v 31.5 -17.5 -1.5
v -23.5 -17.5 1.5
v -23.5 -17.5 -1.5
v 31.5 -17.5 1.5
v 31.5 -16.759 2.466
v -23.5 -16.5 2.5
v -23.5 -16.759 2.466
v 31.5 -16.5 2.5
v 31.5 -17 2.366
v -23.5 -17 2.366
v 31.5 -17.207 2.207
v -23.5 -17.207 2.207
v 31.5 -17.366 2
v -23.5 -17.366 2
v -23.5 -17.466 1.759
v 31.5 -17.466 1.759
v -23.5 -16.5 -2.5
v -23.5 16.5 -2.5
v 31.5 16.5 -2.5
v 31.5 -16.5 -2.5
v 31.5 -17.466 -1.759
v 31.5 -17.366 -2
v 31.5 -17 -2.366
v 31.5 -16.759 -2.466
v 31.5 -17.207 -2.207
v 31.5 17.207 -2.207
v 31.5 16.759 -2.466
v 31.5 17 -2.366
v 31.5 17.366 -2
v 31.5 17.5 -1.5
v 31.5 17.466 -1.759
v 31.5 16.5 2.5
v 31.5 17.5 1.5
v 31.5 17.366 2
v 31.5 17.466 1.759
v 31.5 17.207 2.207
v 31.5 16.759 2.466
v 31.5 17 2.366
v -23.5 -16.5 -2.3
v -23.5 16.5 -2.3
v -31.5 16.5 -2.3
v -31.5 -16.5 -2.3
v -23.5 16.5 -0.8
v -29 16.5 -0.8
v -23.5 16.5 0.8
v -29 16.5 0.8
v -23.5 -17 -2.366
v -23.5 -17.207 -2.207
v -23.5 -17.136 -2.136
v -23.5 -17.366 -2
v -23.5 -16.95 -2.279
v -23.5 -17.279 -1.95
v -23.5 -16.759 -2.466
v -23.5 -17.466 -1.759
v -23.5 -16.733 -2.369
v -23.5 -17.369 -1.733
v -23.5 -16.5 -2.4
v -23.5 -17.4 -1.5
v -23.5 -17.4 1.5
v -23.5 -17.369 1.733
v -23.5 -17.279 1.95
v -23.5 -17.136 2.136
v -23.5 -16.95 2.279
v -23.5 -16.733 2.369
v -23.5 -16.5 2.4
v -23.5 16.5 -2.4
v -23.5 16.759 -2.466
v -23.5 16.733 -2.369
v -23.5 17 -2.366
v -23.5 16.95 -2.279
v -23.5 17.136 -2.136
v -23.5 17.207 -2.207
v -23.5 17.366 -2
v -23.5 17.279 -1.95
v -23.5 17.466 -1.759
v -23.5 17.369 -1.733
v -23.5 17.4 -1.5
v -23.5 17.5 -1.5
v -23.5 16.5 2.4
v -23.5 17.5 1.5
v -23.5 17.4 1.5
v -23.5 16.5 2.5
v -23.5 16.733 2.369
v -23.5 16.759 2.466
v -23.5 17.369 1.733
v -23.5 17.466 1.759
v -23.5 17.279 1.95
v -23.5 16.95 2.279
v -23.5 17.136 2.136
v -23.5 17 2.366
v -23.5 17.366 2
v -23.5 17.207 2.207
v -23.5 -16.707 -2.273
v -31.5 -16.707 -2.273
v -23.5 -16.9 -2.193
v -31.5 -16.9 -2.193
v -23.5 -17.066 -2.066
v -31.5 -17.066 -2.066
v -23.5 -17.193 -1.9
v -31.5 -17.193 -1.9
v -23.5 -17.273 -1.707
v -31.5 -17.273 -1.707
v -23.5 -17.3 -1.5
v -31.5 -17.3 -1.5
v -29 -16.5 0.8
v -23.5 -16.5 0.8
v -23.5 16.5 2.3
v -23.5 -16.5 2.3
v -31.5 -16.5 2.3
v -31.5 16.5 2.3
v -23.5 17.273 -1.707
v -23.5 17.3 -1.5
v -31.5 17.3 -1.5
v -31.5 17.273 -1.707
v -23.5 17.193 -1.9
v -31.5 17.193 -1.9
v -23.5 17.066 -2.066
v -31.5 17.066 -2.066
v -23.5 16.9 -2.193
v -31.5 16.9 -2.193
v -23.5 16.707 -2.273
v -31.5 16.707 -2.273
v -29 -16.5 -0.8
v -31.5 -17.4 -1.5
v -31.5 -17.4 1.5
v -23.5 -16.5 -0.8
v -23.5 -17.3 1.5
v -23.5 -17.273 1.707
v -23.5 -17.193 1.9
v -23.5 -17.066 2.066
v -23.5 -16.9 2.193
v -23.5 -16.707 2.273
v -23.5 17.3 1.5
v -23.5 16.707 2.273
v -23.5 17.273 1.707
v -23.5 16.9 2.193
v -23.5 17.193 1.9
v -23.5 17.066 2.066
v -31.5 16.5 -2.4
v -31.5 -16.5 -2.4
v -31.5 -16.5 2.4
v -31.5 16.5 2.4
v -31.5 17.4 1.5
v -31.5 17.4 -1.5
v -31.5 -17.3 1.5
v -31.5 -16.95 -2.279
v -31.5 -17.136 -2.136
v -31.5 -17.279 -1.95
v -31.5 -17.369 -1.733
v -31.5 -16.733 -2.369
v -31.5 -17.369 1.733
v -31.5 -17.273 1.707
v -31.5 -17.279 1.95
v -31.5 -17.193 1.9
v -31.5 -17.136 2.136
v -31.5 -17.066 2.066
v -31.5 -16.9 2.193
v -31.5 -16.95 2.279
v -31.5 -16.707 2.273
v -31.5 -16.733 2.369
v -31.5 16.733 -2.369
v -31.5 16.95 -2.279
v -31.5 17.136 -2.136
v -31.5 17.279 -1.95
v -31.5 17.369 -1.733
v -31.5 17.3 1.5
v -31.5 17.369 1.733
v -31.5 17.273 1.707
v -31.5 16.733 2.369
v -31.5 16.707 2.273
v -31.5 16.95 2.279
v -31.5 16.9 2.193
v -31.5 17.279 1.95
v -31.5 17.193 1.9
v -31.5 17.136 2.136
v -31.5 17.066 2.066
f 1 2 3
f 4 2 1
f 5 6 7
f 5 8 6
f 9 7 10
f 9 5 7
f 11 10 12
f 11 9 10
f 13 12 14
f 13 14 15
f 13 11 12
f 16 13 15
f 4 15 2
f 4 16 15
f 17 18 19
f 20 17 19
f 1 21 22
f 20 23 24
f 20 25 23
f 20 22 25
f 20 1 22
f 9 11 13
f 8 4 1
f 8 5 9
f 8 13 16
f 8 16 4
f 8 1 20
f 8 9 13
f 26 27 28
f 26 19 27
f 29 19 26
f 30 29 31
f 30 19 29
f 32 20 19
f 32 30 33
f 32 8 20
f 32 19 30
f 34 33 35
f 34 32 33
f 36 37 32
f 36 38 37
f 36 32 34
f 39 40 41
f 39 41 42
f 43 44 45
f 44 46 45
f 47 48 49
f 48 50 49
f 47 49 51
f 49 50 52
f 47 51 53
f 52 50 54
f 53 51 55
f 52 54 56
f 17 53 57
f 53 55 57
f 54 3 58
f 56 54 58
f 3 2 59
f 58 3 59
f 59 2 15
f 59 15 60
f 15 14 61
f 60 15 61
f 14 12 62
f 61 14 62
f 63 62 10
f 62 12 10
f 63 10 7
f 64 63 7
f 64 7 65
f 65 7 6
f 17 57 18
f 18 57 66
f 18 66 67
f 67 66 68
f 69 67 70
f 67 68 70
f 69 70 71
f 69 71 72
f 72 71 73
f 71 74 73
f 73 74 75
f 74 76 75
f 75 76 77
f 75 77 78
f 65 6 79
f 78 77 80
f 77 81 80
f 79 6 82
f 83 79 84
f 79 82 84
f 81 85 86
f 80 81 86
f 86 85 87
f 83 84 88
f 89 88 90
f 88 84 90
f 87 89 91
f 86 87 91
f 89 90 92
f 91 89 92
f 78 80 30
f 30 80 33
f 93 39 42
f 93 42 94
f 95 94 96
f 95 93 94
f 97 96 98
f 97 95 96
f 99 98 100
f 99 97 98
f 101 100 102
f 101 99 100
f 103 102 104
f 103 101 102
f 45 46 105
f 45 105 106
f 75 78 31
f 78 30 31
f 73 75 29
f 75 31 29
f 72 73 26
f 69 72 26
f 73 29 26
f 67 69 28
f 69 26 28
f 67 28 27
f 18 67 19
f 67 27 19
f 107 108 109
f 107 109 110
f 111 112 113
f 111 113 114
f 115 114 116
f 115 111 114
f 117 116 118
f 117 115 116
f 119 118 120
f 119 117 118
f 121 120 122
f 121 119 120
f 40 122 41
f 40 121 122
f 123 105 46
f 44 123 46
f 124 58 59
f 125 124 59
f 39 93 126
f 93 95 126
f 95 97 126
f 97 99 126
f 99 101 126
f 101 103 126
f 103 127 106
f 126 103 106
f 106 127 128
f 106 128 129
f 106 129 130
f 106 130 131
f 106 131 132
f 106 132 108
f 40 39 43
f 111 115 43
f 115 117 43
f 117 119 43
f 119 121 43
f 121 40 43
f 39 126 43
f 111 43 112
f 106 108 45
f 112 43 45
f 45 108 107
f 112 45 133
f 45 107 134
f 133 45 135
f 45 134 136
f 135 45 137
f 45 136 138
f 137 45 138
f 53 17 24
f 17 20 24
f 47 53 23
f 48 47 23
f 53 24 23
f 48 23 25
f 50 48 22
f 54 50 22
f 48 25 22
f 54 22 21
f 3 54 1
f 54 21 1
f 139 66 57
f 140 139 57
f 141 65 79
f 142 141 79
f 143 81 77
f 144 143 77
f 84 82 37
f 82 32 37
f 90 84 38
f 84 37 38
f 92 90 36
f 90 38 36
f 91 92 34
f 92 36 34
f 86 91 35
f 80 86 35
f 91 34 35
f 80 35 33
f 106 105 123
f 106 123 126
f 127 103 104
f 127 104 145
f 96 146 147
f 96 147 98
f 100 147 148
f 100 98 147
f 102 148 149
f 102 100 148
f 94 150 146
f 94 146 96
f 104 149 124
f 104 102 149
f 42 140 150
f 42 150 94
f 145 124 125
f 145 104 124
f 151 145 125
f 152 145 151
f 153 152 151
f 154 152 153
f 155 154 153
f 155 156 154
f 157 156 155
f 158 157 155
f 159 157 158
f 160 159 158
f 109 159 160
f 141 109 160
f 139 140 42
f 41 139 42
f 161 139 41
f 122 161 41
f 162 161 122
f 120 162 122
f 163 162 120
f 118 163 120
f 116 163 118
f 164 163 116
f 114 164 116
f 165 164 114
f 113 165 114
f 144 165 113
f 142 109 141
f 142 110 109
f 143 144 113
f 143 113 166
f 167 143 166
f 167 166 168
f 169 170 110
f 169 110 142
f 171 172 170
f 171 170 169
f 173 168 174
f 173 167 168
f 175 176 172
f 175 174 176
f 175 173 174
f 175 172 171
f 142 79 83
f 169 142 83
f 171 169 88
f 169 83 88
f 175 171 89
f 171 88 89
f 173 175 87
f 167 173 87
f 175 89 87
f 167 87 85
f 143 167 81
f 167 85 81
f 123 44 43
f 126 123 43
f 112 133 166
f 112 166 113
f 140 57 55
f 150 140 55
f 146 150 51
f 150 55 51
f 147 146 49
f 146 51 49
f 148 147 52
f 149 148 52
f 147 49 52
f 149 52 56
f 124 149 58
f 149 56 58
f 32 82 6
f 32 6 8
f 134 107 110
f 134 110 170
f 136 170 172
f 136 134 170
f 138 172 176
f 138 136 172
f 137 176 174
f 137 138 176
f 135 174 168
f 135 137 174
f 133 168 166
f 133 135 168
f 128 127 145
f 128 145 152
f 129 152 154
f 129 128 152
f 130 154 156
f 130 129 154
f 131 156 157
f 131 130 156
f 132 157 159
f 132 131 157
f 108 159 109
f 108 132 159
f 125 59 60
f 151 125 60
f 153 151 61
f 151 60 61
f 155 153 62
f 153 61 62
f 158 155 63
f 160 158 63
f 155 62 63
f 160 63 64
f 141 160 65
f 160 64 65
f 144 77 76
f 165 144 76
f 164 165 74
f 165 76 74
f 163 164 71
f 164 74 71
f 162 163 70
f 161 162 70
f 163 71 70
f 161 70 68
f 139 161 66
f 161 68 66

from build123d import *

# Parameters (mm, degrees)
SKETCH1_W           = 55
SKETCH1_H           = 35
BOSS_EXTRUDE1_DEPTH = 2.5
FILLET1_R           = 1
SKETCH2_W           = 5.5
SKETCH2_H           = 33
BOSS_EXTRUDE2_DEPTH = 0.8
BOSS_EXTRUDE4_DEPTH = 8


with BuildPart() as part:
    # Sketch1 → Boss-Extrude1 (new, symmetric)
    with BuildSketch(Plane.XY):
        with Locations((4, 0)):
            Rectangle(SKETCH1_W, SKETCH1_H)
    extrude(amount=BOSS_EXTRUDE1_DEPTH, both=True)

    # Fillet1
    fillet1_edges = [part.edges().sort_by_distance(p)[0] for p in [
        (4, 17.5, 2.5),
        (4, -17.5, 2.5),
        (4, 17.5, -2.5),
        (4, -17.5, -2.5),
    ]]
    fillet(fillet1_edges, radius=FILLET1_R)

    # Sketch2 → Boss-Extrude2 (add, symmetric)
    with BuildSketch(Plane.XY):
        with Locations((-26.25, 0)):
            Rectangle(SKETCH2_W, SKETCH2_H)
    extrude(amount=BOSS_EXTRUDE2_DEPTH, both=True)

    # Sketch3 → Boss-Extrude4 (add)
    with BuildSketch(Plane.ZY.offset(23.5)):
        with BuildLine():
            Line((-1.5, -17.4), (1.5, -17.4))
            ThreePointArc((1.5, -17.4), (2.136396103, -17.136396103), (2.4, -16.5))
            Line((2.4, -16.5), (2.4, 16.5))
            ThreePointArc((2.4, 16.5), (2.136396103, 17.136396103), (1.5, 17.4))
            Line((1.5, 17.4), (-1.5, 17.4))
            ThreePointArc((-1.5, 17.4), (-2.136396103, 17.136396103), (-2.4, 16.5))
            Line((-2.4, 16.5), (-2.4, -16.5))
            ThreePointArc((-2.4, -16.5), (-2.136396103, -17.136396103), (-1.5, -17.4))
        make_face()
        with BuildLine():
            Line((-1.5, -17.3), (1.5, -17.3))
            ThreePointArc((1.5, -17.3), (2.065685425, -17.065685425), (2.3, -16.5))
            Line((2.3, -16.5), (2.3, 16.5))
            ThreePointArc((2.3, 16.5), (2.065685425, 17.065685425), (1.5, 17.3))
            Line((1.5, 17.3), (-1.5, 17.3))
            ThreePointArc((-1.5, 17.3), (-2.065685425, 17.065685425), (-2.3, 16.5))
            Line((-2.3, 16.5), (-2.3, -16.5))
            ThreePointArc((-2.3, -16.5), (-2.065685425, -17.065685425), (-1.5, -17.3))
        make_face(mode=Mode.SUBTRACT)
    extrude(amount=BOSS_EXTRUDE4_DEPTH)


solid = part.part
